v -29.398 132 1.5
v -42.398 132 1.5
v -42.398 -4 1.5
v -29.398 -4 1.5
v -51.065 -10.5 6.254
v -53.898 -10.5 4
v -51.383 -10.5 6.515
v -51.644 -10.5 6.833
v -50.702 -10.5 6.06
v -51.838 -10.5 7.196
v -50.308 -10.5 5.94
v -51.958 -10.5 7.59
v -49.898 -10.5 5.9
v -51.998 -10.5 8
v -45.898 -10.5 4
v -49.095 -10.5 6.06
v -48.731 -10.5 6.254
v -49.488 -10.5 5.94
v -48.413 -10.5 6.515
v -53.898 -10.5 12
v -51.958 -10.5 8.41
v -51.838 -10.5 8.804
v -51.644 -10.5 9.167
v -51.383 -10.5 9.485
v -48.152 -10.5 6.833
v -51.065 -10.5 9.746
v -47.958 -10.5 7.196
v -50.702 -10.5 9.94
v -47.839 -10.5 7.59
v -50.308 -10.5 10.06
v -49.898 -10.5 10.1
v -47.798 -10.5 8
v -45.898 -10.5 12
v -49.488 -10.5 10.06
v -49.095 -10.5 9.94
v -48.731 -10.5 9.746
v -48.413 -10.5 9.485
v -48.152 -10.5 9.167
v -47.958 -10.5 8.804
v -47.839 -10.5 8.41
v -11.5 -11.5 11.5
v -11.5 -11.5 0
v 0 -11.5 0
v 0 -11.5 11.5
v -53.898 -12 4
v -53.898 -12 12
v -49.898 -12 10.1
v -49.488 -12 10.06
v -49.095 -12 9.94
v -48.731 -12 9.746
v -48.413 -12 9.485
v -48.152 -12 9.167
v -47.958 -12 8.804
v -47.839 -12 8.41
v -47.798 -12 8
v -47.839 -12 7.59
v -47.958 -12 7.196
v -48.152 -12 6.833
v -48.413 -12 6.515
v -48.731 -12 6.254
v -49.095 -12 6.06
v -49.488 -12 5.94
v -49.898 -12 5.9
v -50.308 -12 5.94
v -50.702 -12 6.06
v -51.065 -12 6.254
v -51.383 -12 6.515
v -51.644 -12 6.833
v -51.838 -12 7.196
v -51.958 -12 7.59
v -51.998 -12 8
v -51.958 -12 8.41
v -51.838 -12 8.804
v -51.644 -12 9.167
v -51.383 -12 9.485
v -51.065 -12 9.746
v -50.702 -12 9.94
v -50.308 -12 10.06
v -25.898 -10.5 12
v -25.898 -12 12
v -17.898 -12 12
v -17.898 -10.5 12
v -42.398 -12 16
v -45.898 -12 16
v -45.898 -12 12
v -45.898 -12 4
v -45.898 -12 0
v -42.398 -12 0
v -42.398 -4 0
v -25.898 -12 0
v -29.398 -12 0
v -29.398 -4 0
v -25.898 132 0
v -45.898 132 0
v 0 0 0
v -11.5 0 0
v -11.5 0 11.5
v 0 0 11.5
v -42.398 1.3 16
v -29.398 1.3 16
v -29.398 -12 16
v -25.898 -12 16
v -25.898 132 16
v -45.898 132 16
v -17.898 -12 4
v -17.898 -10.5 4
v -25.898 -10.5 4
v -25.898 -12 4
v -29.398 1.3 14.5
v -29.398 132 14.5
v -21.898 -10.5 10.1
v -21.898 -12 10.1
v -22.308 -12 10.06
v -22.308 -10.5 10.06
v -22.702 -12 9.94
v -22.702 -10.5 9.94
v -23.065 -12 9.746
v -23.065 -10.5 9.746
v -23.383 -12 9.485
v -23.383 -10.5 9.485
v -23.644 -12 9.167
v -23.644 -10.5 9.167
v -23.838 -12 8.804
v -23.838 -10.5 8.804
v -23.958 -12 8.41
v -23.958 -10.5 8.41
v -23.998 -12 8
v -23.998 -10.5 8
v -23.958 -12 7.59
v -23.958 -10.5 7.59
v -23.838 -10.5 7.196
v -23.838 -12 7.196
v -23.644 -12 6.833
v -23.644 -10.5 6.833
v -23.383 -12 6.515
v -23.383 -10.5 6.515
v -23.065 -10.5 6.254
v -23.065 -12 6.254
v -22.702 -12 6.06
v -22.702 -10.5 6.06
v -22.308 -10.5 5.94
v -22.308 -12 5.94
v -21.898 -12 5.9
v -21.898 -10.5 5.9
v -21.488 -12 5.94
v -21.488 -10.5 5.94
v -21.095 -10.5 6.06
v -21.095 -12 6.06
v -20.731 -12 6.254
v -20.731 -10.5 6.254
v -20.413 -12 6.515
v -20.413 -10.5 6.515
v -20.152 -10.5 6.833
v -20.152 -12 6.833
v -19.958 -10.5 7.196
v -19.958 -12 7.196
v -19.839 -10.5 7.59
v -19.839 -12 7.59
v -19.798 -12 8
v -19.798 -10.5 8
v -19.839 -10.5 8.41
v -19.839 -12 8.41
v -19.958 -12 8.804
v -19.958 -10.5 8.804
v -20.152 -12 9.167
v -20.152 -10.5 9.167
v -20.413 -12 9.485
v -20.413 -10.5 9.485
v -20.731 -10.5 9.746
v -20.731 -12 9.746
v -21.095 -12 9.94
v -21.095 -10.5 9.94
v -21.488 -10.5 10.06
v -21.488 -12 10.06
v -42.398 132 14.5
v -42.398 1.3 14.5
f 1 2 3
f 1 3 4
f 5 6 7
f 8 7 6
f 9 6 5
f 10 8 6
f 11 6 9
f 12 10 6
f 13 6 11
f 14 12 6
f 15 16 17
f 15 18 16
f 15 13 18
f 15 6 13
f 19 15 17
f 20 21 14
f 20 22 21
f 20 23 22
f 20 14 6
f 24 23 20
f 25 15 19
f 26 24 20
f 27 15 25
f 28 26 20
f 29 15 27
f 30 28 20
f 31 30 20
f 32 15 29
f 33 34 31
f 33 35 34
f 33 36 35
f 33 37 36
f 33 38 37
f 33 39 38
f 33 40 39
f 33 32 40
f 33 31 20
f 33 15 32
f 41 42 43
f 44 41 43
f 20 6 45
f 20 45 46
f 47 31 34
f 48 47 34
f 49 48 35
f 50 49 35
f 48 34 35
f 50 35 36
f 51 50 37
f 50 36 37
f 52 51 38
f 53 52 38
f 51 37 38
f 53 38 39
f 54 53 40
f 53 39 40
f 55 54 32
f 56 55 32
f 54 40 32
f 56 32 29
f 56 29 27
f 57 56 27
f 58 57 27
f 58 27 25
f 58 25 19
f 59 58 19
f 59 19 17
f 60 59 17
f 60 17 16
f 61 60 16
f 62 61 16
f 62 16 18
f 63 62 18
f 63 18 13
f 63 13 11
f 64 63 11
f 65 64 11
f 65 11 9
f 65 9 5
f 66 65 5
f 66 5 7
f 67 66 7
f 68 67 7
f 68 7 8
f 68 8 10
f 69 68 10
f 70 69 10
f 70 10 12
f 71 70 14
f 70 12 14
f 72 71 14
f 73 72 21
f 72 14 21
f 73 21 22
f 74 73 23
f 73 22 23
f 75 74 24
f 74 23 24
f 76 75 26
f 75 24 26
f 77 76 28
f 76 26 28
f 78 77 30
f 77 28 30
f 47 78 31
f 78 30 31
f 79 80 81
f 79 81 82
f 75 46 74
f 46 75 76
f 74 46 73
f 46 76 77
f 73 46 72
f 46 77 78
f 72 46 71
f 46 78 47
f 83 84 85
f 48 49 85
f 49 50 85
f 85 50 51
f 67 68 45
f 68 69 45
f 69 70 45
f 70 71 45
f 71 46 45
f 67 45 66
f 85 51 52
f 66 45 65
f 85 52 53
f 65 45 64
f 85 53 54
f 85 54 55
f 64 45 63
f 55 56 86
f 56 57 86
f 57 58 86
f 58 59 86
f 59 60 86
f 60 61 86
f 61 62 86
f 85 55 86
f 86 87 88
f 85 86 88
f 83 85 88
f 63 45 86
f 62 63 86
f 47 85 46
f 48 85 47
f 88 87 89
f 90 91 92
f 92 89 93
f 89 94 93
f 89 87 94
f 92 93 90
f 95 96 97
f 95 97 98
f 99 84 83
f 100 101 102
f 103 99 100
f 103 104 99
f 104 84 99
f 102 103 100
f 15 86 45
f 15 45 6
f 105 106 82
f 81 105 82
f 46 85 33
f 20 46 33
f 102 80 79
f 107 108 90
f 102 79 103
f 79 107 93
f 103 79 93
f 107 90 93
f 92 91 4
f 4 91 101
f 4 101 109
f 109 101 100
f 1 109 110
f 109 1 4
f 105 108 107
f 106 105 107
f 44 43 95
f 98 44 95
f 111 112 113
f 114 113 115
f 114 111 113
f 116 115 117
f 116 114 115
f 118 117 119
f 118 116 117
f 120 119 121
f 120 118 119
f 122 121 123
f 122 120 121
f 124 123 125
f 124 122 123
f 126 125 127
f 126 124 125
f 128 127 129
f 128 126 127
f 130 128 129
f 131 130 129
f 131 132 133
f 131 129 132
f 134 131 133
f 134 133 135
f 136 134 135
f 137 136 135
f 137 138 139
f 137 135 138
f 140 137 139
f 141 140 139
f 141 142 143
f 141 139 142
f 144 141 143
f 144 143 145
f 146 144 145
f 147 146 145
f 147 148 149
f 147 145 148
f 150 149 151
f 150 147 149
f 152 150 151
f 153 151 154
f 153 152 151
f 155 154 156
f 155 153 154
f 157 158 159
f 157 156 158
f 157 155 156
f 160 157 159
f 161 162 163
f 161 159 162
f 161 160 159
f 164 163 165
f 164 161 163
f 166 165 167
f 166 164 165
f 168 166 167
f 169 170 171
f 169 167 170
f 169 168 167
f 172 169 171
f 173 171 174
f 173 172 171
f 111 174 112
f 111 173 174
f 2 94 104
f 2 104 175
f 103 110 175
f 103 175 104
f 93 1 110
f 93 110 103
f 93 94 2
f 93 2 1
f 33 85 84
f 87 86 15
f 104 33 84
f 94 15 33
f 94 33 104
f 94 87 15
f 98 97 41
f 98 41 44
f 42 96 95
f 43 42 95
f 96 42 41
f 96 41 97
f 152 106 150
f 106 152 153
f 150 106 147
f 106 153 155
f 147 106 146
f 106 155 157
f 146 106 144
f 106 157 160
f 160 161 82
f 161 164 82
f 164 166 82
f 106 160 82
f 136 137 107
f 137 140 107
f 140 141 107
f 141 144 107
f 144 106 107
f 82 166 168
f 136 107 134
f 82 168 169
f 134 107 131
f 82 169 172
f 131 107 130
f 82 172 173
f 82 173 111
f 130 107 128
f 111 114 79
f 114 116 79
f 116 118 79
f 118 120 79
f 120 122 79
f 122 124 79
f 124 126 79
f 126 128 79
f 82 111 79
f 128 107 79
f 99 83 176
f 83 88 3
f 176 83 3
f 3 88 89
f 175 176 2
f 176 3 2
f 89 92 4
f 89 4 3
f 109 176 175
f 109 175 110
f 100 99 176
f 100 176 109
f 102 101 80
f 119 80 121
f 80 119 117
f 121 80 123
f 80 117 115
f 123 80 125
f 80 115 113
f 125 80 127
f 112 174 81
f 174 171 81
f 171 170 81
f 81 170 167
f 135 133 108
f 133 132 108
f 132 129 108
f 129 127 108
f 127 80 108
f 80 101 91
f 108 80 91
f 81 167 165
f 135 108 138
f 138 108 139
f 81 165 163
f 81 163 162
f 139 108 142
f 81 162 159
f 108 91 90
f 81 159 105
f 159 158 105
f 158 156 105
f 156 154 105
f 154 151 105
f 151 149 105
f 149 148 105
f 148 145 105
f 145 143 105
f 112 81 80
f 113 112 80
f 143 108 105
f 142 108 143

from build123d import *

# Parameters (mm, degrees)
SKETCH1_W           = 11.5
SKETCH1_H           = 11.5
BOSS_EXTRUDE1_DEPTH = 11.5
SKETCH2_W           = 20
SKETCH2_H           = 144
BOSS_EXTRUDE2_DEPTH = 16
SKETCH4_W           = 13
SKETCH4_H           = 13
CUT_EXTRUDE1_DEPTH  = 152.98237065
SKETCH5_W           = 13
SKETCH5_H           = 13.3
CUT_EXTRUDE2_DEPTH  = 1.5
SKETCH6_W           = 13
SKETCH6_H           = 8
CUT_EXTRUDE3_DEPTH  = 1.5
SKETCH7_W           = 8
SKETCH7_H           = 1.5
BOSS_EXTRUDE3_DEPTH = 8
SKETCH8_R           = 2.1
CUT_EXTRUDE4_DEPTH  = 10


with BuildPart() as part:
    # Sketch1 → Boss-Extrude1 (new body)
    with BuildSketch(Plane.XY):
        with Locations((-5.75, -5.75)):
            Rectangle(SKETCH1_W, SKETCH1_H)
    extrude(amount=BOSS_EXTRUDE1_DEPTH)


with BuildPart() as body_2:
    # Sketch2 → Boss-Extrude2 (new body)
    with BuildSketch(Plane.XY):
        with Locations((-35.898158877, 60)):
            Rectangle(SKETCH2_W, SKETCH2_H)
    extrude(amount=BOSS_EXTRUDE2_DEPTH)

    # Sketch4 → Cut-Extrude1 (cut, through all)
    with BuildSketch(Plane(origin=(0, 132, 0), x_dir=(1, 0, 0), z_dir=(0, 1, 0))):
        with Locations((-35.898158877, -8)):
            Rectangle(SKETCH4_W, SKETCH4_H)
    extrude(amount=-CUT_EXTRUDE1_DEPTH, mode=Mode.SUBTRACT)

    # Sketch5 → Cut-Extrude2 (cut)
    with BuildSketch(Plane.XY.offset(16)):
        with Locations((-35.898158877, -5.35)):
            Rectangle(SKETCH5_W, SKETCH5_H)
    extrude(amount=-CUT_EXTRUDE2_DEPTH, mode=Mode.SUBTRACT)

    # Sketch6 → Cut-Extrude3 (cut)
    with BuildSketch(Plane(origin=(0, 0, 0), x_dir=(-1, 0, 0), z_dir=(0, 0, -1))):
        with Locations((35.898158877, -8)):
            Rectangle(SKETCH6_W, SKETCH6_H)
    extrude(amount=-CUT_EXTRUDE3_DEPTH, mode=Mode.SUBTRACT)

    # Sketch7 → Boss-Extrude3 (add)
    with BuildSketch(Plane.ZY.offset(45.898158877)):
        with Locations((8, -11.25)):
            Rectangle(SKETCH7_W, SKETCH7_H)
    boss_extrude3 = extrude(amount=BOSS_EXTRUDE3_DEPTH)

    # Sketch8 → Cut-Extrude4 (cut)
    with BuildSketch(Plane(origin=(0, -10.5, 0), x_dir=(1, 0, 0), z_dir=(0, 1, 0))):
        with Locations(Location((-49.898158877, -8, 0), (0, 0, 270))):
            Circle(SKETCH8_R)
    cut_extrude4 = extrude(amount=-CUT_EXTRUDE4_DEPTH, mode=Mode.SUBTRACT)

    # Mirror3: Boss-Extrude3, Cut-Extrude4 across plane
    add(boss_extrude3.mirror(Plane.ZY.offset(35.898158877)))
    add(cut_extrude4.mirror(Plane.ZY.offset(35.898158877)), mode=Mode.SUBTRACT)


solid = Compound([part.part, body_2.part])
